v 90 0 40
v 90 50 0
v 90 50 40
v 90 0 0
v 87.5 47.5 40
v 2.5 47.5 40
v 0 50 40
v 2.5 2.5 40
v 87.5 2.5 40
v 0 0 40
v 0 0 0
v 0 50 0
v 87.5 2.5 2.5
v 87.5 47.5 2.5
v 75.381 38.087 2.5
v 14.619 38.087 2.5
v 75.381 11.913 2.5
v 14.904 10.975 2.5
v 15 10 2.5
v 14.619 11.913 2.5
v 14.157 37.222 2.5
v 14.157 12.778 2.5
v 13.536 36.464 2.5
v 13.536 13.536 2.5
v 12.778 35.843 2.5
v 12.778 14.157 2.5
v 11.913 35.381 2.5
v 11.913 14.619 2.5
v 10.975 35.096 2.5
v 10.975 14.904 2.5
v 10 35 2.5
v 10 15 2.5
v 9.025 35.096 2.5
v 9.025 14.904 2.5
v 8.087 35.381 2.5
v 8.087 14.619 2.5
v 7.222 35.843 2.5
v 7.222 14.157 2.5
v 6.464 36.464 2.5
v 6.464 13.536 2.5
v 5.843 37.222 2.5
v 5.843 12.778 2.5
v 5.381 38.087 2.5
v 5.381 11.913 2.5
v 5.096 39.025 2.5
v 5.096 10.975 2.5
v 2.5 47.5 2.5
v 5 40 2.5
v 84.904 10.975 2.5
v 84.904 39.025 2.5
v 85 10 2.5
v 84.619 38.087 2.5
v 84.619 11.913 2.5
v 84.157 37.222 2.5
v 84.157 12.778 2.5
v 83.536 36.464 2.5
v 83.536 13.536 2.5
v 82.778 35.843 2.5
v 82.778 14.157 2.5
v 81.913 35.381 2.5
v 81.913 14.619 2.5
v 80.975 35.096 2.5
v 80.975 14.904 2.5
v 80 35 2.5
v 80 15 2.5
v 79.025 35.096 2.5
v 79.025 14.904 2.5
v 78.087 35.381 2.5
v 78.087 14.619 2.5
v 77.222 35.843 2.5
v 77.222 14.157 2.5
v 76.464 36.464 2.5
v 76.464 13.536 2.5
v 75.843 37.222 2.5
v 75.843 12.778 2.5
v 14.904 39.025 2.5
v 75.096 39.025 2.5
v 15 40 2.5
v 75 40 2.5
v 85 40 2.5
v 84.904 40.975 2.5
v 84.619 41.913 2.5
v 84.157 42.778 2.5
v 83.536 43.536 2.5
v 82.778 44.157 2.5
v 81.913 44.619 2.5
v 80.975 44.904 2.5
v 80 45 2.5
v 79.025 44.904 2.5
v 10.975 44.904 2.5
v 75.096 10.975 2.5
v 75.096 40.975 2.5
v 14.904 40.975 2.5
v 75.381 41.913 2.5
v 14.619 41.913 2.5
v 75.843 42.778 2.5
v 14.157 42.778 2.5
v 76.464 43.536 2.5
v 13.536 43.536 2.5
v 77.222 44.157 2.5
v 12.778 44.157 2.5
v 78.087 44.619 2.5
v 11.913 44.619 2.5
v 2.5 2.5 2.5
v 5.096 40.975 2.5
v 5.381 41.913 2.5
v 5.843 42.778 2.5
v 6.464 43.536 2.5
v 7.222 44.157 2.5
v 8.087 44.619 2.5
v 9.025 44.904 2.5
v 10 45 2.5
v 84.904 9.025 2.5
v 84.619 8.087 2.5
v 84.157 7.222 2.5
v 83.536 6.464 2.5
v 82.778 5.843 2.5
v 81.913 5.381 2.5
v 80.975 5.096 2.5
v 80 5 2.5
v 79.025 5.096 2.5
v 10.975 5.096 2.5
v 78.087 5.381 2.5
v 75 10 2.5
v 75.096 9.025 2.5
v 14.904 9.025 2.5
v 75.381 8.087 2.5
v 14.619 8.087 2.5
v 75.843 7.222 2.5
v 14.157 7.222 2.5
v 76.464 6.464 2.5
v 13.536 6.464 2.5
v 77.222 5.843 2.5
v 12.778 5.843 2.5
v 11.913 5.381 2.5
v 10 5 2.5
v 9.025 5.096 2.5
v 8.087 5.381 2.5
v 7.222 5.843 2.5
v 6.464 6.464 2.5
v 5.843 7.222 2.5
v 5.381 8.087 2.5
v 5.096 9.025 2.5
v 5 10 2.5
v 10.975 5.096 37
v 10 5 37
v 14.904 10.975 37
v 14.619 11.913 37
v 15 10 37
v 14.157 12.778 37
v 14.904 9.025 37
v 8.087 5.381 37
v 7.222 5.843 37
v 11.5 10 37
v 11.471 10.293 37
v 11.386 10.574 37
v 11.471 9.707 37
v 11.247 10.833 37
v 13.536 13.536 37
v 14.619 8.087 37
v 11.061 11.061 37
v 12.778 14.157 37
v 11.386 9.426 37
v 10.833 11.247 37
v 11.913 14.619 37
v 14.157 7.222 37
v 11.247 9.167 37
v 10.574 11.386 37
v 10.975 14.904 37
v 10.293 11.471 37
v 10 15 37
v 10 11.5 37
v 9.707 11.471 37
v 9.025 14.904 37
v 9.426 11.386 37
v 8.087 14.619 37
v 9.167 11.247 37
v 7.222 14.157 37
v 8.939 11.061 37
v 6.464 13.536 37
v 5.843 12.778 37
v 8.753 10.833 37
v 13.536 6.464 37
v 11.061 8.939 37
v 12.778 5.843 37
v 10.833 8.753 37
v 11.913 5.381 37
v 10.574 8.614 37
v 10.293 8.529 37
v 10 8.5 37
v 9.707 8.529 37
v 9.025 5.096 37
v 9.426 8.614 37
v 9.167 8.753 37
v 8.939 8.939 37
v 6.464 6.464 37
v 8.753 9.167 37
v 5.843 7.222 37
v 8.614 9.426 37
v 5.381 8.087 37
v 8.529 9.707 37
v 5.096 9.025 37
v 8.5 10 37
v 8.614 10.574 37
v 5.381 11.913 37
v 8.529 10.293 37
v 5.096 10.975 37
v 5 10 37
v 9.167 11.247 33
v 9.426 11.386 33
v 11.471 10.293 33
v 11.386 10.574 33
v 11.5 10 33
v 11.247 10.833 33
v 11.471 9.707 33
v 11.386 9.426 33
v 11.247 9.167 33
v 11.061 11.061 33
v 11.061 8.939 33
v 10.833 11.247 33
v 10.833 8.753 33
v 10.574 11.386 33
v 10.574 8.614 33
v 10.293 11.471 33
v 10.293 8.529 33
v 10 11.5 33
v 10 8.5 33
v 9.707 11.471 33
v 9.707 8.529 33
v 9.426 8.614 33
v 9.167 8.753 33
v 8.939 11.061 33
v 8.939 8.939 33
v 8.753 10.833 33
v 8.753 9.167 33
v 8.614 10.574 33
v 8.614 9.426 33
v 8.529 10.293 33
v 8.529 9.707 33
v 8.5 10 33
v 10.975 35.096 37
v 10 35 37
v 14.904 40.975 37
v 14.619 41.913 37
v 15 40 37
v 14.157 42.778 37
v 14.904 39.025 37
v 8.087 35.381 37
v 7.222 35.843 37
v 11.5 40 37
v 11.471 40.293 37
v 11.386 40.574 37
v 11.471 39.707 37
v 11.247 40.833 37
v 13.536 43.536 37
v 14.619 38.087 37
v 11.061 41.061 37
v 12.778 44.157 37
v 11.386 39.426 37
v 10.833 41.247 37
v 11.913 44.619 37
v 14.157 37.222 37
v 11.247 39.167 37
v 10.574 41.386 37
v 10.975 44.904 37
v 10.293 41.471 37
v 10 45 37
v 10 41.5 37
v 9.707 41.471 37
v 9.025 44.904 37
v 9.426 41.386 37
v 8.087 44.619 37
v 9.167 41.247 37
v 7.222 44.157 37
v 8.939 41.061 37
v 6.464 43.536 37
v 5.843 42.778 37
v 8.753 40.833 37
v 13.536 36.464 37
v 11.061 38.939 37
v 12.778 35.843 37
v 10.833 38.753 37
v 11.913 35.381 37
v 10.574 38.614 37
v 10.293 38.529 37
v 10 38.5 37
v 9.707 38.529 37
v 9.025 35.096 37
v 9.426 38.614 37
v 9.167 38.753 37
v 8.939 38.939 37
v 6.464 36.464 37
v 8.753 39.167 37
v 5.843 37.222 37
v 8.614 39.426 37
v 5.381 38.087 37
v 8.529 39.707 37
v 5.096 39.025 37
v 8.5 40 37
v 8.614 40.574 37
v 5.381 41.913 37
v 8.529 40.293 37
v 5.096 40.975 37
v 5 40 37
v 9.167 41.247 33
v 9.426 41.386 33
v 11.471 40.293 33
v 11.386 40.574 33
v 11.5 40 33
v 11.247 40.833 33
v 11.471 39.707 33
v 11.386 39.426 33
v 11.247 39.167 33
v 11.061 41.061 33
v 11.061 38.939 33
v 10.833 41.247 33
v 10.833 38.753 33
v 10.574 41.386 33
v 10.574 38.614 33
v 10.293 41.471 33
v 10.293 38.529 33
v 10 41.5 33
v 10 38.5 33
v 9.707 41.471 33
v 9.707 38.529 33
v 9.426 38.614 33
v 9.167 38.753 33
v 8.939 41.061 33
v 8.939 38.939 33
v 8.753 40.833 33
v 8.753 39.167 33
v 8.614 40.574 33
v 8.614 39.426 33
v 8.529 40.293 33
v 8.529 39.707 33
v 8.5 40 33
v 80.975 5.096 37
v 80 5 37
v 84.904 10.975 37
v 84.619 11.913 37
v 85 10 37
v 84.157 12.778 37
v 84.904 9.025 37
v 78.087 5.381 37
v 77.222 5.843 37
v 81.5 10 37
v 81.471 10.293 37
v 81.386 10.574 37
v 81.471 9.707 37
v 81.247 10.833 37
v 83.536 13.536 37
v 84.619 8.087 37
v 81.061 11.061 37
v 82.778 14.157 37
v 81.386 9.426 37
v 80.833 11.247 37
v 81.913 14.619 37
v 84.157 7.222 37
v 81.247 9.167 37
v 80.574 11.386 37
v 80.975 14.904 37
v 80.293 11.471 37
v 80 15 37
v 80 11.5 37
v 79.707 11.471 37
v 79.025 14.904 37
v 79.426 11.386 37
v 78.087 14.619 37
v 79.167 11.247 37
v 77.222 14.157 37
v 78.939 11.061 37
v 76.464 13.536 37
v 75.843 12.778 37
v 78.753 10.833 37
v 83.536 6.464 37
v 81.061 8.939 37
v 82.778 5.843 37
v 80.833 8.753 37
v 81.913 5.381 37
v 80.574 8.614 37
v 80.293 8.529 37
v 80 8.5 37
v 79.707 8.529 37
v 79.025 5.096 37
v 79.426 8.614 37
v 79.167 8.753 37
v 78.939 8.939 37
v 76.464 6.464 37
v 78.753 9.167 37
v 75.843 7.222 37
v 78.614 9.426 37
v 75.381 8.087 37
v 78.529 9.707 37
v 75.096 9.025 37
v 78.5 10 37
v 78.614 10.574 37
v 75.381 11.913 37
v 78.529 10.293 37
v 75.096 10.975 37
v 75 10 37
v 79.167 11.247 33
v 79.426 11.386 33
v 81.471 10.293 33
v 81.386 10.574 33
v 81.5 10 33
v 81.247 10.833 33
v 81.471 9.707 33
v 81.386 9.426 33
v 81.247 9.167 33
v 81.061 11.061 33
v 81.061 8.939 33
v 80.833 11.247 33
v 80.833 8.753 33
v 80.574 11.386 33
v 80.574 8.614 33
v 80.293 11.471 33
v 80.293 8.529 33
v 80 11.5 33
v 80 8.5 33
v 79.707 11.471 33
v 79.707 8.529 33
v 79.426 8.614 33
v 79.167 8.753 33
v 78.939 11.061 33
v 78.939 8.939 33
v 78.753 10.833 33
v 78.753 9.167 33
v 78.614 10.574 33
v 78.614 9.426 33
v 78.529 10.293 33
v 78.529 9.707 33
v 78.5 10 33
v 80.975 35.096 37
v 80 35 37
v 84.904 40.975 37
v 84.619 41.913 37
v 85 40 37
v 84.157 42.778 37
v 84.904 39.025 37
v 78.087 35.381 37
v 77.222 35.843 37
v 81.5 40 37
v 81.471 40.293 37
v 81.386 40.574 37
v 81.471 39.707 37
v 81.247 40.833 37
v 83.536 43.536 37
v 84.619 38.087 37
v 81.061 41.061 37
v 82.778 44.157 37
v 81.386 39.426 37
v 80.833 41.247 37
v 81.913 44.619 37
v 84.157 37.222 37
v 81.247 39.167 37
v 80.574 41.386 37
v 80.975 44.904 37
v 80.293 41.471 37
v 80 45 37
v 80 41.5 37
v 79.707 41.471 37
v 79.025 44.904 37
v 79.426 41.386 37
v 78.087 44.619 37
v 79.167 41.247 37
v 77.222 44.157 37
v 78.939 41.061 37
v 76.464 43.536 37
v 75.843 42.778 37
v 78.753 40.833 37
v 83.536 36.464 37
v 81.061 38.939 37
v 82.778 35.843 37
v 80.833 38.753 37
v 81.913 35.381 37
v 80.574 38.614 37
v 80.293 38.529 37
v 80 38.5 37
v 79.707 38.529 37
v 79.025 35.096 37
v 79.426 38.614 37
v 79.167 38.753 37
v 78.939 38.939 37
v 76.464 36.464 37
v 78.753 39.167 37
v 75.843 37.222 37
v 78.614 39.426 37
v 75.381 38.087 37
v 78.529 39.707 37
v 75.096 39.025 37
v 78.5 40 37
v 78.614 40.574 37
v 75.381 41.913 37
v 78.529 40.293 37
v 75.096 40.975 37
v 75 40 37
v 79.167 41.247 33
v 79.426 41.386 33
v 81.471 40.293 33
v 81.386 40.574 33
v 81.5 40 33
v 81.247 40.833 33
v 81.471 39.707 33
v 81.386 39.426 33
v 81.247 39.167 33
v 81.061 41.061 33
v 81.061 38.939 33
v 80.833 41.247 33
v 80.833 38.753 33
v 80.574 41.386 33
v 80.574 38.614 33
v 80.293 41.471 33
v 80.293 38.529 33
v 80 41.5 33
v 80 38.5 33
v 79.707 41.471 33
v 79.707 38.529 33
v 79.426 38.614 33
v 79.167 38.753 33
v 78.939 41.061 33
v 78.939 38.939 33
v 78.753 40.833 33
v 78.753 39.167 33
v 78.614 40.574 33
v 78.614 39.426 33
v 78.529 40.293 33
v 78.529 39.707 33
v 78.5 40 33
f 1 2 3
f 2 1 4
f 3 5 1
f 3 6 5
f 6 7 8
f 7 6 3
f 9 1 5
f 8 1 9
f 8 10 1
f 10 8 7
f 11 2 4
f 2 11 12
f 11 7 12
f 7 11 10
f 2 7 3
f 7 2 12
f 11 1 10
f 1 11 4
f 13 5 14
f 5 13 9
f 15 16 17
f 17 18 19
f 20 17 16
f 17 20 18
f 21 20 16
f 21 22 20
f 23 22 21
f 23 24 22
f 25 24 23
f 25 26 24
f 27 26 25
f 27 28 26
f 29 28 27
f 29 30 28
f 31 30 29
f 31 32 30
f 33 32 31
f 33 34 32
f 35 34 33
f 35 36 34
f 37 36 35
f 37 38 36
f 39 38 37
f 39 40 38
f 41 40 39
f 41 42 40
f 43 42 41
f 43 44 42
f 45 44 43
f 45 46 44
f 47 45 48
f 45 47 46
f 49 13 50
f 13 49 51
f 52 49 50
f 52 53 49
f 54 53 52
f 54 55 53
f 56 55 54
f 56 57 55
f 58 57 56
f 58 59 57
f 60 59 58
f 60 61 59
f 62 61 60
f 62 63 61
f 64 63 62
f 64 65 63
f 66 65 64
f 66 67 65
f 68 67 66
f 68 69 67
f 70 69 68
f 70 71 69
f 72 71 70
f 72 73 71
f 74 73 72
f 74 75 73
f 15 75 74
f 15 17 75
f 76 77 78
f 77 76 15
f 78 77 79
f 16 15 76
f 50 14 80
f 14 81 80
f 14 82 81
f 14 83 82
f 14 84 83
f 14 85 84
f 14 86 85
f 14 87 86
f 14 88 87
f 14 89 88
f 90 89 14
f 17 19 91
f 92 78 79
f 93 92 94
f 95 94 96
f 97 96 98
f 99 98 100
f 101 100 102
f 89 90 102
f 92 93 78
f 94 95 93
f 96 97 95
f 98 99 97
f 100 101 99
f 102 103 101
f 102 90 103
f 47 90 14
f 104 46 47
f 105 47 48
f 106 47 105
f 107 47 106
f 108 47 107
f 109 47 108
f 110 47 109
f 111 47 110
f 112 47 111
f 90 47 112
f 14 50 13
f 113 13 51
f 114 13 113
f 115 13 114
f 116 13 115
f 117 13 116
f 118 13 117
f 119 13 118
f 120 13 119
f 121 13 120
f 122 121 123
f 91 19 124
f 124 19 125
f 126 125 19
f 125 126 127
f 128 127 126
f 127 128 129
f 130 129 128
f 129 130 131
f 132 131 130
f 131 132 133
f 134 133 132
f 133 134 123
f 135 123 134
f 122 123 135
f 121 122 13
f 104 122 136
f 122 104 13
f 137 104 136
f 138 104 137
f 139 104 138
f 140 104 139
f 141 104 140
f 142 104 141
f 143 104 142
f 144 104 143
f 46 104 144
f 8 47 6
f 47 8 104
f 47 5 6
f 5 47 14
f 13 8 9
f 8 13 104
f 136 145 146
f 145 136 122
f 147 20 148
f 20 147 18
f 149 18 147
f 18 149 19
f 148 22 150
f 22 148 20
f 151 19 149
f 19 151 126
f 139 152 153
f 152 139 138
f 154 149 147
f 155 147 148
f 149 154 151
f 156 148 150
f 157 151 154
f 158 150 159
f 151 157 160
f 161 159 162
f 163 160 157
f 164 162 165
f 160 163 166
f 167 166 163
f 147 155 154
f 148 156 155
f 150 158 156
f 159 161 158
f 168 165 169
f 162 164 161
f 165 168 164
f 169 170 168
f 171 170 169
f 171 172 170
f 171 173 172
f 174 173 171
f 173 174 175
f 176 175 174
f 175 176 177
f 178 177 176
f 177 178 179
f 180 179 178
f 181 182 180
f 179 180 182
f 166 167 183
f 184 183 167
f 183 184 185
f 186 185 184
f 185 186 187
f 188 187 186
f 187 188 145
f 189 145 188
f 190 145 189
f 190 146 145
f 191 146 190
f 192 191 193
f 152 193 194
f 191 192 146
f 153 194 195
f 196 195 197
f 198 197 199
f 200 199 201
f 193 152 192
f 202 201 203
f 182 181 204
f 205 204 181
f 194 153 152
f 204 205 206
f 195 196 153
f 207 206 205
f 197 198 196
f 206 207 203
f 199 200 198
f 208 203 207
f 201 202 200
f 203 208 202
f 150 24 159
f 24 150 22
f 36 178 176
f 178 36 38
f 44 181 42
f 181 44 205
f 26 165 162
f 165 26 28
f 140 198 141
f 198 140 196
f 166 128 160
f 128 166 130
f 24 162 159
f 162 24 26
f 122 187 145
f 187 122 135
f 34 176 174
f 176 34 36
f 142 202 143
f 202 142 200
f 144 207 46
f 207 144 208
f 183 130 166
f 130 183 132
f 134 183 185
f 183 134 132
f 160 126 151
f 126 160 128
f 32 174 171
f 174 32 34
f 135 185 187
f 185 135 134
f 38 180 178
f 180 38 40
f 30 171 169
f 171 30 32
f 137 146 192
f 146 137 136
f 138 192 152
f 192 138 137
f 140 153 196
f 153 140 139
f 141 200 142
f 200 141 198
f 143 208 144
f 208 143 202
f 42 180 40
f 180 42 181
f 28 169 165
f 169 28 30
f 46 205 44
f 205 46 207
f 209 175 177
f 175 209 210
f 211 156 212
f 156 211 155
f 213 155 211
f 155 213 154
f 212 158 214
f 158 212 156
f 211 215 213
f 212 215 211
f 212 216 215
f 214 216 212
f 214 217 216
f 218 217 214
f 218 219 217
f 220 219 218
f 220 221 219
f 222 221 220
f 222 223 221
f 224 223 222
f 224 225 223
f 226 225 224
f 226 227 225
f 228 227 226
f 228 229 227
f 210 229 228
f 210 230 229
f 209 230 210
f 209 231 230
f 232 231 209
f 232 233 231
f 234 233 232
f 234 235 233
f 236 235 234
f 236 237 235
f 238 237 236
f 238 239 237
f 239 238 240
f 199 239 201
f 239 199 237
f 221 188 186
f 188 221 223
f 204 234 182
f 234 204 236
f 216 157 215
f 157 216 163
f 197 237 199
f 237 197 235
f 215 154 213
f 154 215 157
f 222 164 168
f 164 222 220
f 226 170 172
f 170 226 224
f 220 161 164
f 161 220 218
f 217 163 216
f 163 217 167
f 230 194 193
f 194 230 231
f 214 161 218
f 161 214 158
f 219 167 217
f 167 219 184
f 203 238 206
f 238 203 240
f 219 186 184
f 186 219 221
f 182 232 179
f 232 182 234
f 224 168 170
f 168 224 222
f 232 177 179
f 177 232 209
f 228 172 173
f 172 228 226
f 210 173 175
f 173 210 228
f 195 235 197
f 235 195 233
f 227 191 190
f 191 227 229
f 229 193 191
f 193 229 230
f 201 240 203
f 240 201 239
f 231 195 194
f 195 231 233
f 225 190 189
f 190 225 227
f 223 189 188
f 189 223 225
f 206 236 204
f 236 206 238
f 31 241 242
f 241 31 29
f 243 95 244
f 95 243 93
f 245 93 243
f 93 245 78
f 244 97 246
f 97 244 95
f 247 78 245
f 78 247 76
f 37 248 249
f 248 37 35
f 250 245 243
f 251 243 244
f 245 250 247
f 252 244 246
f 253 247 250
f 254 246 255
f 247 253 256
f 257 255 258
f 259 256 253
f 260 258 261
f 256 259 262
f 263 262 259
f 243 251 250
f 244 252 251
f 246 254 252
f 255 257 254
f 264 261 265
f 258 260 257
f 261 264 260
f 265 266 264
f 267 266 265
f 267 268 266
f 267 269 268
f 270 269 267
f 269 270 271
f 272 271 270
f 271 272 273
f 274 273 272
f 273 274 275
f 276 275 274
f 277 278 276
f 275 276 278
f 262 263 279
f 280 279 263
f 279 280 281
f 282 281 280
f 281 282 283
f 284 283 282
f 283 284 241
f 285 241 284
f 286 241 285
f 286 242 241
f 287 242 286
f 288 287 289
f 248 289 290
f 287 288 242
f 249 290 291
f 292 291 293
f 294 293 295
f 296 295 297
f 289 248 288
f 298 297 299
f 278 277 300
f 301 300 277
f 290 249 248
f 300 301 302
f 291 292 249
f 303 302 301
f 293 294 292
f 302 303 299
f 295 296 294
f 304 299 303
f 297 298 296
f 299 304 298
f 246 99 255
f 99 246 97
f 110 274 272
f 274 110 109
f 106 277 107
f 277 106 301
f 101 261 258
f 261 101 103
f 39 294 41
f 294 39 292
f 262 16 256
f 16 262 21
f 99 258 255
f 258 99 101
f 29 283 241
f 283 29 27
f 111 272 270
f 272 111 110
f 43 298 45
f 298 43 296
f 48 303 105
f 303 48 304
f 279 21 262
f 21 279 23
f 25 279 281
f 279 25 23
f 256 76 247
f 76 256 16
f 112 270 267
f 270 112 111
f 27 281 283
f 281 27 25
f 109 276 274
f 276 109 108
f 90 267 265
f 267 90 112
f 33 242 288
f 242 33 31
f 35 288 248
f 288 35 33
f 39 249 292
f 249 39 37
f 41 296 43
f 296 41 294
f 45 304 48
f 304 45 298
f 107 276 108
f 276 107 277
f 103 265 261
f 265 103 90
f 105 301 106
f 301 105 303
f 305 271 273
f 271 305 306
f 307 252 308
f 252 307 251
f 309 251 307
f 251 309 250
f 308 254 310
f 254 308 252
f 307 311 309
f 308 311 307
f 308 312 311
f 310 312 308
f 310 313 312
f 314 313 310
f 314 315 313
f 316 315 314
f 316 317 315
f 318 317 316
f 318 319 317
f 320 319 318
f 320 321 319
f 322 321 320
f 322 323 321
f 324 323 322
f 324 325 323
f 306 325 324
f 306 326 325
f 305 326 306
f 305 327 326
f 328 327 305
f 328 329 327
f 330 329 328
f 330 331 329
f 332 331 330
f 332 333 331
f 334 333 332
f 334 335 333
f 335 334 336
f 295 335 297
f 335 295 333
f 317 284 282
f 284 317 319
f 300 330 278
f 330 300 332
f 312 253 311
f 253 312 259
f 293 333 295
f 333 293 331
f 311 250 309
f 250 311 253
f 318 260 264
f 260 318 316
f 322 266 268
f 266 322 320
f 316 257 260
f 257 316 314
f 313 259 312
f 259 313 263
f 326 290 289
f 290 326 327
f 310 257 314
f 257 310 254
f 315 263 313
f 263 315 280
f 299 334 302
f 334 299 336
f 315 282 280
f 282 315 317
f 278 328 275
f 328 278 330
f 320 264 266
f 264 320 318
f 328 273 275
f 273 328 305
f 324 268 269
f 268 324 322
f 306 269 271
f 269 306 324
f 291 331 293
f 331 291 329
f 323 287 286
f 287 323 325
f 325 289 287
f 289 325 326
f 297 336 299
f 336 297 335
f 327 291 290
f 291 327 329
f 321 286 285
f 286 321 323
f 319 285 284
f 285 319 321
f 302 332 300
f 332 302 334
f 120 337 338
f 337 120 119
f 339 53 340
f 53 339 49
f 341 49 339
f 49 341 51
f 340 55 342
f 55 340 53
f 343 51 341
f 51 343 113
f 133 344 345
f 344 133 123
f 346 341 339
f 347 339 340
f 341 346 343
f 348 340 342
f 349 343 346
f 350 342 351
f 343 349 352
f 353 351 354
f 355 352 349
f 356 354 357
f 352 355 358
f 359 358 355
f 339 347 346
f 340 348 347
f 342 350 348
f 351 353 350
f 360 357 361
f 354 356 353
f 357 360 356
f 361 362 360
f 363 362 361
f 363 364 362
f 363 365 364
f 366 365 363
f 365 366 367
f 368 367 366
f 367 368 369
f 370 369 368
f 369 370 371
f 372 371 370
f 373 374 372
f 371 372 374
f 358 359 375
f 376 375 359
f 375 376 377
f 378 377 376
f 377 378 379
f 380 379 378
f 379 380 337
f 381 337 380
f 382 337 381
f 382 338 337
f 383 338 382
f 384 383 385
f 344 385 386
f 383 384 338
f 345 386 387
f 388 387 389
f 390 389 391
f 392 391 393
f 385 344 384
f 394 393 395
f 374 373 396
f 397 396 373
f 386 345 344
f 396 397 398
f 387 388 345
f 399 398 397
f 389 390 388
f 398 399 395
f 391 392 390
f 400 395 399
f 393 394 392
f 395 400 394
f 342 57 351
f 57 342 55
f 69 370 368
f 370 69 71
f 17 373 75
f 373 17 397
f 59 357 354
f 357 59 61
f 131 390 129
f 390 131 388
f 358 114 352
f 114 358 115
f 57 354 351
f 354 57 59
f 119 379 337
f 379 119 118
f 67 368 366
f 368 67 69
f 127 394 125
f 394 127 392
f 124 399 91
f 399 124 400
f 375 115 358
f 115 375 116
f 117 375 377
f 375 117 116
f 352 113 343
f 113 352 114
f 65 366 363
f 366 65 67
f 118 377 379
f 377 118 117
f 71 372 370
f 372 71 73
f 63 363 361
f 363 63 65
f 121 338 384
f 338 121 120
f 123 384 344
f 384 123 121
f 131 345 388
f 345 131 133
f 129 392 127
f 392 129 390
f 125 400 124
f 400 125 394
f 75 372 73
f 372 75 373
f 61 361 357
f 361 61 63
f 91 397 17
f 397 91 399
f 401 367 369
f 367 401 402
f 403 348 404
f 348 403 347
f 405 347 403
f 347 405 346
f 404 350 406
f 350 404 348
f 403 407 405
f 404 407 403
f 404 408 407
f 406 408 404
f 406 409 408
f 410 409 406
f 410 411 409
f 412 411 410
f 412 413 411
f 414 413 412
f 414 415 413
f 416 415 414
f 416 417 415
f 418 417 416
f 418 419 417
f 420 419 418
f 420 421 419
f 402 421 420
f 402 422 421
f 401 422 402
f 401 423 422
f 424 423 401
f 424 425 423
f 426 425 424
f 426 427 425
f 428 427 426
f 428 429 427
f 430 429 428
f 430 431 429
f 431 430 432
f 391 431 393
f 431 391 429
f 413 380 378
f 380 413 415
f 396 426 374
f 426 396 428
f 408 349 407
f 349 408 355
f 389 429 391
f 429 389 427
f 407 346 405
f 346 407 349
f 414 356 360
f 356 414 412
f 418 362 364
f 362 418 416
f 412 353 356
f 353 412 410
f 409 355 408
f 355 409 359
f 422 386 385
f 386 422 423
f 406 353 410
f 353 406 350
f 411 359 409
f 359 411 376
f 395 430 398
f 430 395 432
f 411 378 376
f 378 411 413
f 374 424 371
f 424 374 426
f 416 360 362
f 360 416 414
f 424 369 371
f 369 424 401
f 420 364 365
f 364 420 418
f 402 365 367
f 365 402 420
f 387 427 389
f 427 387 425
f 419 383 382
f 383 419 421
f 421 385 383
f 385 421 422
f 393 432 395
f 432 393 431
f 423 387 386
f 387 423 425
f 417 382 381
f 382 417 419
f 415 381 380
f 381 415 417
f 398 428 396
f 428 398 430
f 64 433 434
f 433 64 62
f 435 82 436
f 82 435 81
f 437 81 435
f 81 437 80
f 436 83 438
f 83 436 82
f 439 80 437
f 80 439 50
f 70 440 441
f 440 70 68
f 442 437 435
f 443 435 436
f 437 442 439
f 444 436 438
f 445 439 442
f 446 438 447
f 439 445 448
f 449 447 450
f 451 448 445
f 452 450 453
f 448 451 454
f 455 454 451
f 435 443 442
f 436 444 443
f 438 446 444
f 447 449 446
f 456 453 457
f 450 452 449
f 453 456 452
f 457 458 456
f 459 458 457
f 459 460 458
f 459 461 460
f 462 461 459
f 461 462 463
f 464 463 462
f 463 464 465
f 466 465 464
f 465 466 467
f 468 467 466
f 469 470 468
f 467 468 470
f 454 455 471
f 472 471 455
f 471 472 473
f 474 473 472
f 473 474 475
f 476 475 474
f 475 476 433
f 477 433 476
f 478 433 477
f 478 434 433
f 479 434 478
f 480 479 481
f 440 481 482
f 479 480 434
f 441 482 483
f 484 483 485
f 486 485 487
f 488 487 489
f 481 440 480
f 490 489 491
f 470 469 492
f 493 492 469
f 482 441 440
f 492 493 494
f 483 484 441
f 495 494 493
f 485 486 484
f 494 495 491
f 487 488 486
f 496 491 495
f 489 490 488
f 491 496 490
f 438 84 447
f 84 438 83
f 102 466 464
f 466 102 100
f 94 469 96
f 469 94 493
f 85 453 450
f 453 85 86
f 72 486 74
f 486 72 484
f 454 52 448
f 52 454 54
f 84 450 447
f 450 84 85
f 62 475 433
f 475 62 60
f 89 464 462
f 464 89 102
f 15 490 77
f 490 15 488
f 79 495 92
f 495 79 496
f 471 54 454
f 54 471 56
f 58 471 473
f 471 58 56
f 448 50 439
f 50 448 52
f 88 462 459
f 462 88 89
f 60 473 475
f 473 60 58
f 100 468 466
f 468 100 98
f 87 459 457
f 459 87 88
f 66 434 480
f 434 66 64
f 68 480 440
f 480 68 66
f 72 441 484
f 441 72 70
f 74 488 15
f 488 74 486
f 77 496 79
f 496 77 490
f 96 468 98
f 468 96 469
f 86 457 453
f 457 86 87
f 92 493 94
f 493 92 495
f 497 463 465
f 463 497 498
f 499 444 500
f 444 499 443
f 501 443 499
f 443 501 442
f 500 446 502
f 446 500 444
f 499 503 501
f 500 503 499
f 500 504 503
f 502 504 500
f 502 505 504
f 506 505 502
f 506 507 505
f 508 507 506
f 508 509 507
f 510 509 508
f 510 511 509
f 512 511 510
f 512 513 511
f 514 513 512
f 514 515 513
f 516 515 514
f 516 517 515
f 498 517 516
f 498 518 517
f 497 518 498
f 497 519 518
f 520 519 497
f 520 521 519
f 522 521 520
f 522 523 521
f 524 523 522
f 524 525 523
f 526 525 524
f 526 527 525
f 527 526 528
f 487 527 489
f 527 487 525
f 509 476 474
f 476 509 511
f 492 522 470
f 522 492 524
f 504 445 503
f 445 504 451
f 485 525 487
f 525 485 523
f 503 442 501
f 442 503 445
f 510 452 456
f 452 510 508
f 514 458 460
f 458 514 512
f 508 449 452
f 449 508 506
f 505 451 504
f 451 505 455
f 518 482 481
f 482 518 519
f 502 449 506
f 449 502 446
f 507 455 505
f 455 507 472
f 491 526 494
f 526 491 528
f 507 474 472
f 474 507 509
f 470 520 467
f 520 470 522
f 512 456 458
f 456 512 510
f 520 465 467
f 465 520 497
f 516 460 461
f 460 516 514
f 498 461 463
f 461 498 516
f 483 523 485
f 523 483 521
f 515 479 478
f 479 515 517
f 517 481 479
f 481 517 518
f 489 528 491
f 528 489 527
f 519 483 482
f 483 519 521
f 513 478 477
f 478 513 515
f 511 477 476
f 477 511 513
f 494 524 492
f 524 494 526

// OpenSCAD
$fn = 32;

// ----------------------------------------------------------------------
// Enclosure box: bosses enclosure
// ----------------------------------------------------------------------

// --- parameters (mm) ---
box_l = 90;               // outer length, X
box_w = 50;               // outer width, Y
box_h = 40;               // outer height
wall_t = 2.5;             // wall thickness
boss_r = 5;               // corner boss radius
hole_r = 1.5;             // boss screw hole radius
boss_in = 10;             // boss inset from the corners

inner_h = box_h - wall_t;  // cavity depth
boss_h = inner_h - 2;  // corner boss height

difference() {
  union() {
    difference() {
      cube([box_l, box_w, box_h]);
      translate([wall_t, wall_t, wall_t])
        cube([box_l - 2 * wall_t, box_w - 2 * wall_t, box_h]);
    }
    for (sx = [0, 1], sy = [0, 1])
      translate([sx ? box_l - boss_in : boss_in,
                 sy ? box_w - boss_in : boss_in, wall_t - 1])
        difference() {
          cylinder(r = boss_r, h = boss_h);
          translate([0, 0, boss_h - 4])
            cylinder(r = hole_r, h = 5);
        }
  }
}
